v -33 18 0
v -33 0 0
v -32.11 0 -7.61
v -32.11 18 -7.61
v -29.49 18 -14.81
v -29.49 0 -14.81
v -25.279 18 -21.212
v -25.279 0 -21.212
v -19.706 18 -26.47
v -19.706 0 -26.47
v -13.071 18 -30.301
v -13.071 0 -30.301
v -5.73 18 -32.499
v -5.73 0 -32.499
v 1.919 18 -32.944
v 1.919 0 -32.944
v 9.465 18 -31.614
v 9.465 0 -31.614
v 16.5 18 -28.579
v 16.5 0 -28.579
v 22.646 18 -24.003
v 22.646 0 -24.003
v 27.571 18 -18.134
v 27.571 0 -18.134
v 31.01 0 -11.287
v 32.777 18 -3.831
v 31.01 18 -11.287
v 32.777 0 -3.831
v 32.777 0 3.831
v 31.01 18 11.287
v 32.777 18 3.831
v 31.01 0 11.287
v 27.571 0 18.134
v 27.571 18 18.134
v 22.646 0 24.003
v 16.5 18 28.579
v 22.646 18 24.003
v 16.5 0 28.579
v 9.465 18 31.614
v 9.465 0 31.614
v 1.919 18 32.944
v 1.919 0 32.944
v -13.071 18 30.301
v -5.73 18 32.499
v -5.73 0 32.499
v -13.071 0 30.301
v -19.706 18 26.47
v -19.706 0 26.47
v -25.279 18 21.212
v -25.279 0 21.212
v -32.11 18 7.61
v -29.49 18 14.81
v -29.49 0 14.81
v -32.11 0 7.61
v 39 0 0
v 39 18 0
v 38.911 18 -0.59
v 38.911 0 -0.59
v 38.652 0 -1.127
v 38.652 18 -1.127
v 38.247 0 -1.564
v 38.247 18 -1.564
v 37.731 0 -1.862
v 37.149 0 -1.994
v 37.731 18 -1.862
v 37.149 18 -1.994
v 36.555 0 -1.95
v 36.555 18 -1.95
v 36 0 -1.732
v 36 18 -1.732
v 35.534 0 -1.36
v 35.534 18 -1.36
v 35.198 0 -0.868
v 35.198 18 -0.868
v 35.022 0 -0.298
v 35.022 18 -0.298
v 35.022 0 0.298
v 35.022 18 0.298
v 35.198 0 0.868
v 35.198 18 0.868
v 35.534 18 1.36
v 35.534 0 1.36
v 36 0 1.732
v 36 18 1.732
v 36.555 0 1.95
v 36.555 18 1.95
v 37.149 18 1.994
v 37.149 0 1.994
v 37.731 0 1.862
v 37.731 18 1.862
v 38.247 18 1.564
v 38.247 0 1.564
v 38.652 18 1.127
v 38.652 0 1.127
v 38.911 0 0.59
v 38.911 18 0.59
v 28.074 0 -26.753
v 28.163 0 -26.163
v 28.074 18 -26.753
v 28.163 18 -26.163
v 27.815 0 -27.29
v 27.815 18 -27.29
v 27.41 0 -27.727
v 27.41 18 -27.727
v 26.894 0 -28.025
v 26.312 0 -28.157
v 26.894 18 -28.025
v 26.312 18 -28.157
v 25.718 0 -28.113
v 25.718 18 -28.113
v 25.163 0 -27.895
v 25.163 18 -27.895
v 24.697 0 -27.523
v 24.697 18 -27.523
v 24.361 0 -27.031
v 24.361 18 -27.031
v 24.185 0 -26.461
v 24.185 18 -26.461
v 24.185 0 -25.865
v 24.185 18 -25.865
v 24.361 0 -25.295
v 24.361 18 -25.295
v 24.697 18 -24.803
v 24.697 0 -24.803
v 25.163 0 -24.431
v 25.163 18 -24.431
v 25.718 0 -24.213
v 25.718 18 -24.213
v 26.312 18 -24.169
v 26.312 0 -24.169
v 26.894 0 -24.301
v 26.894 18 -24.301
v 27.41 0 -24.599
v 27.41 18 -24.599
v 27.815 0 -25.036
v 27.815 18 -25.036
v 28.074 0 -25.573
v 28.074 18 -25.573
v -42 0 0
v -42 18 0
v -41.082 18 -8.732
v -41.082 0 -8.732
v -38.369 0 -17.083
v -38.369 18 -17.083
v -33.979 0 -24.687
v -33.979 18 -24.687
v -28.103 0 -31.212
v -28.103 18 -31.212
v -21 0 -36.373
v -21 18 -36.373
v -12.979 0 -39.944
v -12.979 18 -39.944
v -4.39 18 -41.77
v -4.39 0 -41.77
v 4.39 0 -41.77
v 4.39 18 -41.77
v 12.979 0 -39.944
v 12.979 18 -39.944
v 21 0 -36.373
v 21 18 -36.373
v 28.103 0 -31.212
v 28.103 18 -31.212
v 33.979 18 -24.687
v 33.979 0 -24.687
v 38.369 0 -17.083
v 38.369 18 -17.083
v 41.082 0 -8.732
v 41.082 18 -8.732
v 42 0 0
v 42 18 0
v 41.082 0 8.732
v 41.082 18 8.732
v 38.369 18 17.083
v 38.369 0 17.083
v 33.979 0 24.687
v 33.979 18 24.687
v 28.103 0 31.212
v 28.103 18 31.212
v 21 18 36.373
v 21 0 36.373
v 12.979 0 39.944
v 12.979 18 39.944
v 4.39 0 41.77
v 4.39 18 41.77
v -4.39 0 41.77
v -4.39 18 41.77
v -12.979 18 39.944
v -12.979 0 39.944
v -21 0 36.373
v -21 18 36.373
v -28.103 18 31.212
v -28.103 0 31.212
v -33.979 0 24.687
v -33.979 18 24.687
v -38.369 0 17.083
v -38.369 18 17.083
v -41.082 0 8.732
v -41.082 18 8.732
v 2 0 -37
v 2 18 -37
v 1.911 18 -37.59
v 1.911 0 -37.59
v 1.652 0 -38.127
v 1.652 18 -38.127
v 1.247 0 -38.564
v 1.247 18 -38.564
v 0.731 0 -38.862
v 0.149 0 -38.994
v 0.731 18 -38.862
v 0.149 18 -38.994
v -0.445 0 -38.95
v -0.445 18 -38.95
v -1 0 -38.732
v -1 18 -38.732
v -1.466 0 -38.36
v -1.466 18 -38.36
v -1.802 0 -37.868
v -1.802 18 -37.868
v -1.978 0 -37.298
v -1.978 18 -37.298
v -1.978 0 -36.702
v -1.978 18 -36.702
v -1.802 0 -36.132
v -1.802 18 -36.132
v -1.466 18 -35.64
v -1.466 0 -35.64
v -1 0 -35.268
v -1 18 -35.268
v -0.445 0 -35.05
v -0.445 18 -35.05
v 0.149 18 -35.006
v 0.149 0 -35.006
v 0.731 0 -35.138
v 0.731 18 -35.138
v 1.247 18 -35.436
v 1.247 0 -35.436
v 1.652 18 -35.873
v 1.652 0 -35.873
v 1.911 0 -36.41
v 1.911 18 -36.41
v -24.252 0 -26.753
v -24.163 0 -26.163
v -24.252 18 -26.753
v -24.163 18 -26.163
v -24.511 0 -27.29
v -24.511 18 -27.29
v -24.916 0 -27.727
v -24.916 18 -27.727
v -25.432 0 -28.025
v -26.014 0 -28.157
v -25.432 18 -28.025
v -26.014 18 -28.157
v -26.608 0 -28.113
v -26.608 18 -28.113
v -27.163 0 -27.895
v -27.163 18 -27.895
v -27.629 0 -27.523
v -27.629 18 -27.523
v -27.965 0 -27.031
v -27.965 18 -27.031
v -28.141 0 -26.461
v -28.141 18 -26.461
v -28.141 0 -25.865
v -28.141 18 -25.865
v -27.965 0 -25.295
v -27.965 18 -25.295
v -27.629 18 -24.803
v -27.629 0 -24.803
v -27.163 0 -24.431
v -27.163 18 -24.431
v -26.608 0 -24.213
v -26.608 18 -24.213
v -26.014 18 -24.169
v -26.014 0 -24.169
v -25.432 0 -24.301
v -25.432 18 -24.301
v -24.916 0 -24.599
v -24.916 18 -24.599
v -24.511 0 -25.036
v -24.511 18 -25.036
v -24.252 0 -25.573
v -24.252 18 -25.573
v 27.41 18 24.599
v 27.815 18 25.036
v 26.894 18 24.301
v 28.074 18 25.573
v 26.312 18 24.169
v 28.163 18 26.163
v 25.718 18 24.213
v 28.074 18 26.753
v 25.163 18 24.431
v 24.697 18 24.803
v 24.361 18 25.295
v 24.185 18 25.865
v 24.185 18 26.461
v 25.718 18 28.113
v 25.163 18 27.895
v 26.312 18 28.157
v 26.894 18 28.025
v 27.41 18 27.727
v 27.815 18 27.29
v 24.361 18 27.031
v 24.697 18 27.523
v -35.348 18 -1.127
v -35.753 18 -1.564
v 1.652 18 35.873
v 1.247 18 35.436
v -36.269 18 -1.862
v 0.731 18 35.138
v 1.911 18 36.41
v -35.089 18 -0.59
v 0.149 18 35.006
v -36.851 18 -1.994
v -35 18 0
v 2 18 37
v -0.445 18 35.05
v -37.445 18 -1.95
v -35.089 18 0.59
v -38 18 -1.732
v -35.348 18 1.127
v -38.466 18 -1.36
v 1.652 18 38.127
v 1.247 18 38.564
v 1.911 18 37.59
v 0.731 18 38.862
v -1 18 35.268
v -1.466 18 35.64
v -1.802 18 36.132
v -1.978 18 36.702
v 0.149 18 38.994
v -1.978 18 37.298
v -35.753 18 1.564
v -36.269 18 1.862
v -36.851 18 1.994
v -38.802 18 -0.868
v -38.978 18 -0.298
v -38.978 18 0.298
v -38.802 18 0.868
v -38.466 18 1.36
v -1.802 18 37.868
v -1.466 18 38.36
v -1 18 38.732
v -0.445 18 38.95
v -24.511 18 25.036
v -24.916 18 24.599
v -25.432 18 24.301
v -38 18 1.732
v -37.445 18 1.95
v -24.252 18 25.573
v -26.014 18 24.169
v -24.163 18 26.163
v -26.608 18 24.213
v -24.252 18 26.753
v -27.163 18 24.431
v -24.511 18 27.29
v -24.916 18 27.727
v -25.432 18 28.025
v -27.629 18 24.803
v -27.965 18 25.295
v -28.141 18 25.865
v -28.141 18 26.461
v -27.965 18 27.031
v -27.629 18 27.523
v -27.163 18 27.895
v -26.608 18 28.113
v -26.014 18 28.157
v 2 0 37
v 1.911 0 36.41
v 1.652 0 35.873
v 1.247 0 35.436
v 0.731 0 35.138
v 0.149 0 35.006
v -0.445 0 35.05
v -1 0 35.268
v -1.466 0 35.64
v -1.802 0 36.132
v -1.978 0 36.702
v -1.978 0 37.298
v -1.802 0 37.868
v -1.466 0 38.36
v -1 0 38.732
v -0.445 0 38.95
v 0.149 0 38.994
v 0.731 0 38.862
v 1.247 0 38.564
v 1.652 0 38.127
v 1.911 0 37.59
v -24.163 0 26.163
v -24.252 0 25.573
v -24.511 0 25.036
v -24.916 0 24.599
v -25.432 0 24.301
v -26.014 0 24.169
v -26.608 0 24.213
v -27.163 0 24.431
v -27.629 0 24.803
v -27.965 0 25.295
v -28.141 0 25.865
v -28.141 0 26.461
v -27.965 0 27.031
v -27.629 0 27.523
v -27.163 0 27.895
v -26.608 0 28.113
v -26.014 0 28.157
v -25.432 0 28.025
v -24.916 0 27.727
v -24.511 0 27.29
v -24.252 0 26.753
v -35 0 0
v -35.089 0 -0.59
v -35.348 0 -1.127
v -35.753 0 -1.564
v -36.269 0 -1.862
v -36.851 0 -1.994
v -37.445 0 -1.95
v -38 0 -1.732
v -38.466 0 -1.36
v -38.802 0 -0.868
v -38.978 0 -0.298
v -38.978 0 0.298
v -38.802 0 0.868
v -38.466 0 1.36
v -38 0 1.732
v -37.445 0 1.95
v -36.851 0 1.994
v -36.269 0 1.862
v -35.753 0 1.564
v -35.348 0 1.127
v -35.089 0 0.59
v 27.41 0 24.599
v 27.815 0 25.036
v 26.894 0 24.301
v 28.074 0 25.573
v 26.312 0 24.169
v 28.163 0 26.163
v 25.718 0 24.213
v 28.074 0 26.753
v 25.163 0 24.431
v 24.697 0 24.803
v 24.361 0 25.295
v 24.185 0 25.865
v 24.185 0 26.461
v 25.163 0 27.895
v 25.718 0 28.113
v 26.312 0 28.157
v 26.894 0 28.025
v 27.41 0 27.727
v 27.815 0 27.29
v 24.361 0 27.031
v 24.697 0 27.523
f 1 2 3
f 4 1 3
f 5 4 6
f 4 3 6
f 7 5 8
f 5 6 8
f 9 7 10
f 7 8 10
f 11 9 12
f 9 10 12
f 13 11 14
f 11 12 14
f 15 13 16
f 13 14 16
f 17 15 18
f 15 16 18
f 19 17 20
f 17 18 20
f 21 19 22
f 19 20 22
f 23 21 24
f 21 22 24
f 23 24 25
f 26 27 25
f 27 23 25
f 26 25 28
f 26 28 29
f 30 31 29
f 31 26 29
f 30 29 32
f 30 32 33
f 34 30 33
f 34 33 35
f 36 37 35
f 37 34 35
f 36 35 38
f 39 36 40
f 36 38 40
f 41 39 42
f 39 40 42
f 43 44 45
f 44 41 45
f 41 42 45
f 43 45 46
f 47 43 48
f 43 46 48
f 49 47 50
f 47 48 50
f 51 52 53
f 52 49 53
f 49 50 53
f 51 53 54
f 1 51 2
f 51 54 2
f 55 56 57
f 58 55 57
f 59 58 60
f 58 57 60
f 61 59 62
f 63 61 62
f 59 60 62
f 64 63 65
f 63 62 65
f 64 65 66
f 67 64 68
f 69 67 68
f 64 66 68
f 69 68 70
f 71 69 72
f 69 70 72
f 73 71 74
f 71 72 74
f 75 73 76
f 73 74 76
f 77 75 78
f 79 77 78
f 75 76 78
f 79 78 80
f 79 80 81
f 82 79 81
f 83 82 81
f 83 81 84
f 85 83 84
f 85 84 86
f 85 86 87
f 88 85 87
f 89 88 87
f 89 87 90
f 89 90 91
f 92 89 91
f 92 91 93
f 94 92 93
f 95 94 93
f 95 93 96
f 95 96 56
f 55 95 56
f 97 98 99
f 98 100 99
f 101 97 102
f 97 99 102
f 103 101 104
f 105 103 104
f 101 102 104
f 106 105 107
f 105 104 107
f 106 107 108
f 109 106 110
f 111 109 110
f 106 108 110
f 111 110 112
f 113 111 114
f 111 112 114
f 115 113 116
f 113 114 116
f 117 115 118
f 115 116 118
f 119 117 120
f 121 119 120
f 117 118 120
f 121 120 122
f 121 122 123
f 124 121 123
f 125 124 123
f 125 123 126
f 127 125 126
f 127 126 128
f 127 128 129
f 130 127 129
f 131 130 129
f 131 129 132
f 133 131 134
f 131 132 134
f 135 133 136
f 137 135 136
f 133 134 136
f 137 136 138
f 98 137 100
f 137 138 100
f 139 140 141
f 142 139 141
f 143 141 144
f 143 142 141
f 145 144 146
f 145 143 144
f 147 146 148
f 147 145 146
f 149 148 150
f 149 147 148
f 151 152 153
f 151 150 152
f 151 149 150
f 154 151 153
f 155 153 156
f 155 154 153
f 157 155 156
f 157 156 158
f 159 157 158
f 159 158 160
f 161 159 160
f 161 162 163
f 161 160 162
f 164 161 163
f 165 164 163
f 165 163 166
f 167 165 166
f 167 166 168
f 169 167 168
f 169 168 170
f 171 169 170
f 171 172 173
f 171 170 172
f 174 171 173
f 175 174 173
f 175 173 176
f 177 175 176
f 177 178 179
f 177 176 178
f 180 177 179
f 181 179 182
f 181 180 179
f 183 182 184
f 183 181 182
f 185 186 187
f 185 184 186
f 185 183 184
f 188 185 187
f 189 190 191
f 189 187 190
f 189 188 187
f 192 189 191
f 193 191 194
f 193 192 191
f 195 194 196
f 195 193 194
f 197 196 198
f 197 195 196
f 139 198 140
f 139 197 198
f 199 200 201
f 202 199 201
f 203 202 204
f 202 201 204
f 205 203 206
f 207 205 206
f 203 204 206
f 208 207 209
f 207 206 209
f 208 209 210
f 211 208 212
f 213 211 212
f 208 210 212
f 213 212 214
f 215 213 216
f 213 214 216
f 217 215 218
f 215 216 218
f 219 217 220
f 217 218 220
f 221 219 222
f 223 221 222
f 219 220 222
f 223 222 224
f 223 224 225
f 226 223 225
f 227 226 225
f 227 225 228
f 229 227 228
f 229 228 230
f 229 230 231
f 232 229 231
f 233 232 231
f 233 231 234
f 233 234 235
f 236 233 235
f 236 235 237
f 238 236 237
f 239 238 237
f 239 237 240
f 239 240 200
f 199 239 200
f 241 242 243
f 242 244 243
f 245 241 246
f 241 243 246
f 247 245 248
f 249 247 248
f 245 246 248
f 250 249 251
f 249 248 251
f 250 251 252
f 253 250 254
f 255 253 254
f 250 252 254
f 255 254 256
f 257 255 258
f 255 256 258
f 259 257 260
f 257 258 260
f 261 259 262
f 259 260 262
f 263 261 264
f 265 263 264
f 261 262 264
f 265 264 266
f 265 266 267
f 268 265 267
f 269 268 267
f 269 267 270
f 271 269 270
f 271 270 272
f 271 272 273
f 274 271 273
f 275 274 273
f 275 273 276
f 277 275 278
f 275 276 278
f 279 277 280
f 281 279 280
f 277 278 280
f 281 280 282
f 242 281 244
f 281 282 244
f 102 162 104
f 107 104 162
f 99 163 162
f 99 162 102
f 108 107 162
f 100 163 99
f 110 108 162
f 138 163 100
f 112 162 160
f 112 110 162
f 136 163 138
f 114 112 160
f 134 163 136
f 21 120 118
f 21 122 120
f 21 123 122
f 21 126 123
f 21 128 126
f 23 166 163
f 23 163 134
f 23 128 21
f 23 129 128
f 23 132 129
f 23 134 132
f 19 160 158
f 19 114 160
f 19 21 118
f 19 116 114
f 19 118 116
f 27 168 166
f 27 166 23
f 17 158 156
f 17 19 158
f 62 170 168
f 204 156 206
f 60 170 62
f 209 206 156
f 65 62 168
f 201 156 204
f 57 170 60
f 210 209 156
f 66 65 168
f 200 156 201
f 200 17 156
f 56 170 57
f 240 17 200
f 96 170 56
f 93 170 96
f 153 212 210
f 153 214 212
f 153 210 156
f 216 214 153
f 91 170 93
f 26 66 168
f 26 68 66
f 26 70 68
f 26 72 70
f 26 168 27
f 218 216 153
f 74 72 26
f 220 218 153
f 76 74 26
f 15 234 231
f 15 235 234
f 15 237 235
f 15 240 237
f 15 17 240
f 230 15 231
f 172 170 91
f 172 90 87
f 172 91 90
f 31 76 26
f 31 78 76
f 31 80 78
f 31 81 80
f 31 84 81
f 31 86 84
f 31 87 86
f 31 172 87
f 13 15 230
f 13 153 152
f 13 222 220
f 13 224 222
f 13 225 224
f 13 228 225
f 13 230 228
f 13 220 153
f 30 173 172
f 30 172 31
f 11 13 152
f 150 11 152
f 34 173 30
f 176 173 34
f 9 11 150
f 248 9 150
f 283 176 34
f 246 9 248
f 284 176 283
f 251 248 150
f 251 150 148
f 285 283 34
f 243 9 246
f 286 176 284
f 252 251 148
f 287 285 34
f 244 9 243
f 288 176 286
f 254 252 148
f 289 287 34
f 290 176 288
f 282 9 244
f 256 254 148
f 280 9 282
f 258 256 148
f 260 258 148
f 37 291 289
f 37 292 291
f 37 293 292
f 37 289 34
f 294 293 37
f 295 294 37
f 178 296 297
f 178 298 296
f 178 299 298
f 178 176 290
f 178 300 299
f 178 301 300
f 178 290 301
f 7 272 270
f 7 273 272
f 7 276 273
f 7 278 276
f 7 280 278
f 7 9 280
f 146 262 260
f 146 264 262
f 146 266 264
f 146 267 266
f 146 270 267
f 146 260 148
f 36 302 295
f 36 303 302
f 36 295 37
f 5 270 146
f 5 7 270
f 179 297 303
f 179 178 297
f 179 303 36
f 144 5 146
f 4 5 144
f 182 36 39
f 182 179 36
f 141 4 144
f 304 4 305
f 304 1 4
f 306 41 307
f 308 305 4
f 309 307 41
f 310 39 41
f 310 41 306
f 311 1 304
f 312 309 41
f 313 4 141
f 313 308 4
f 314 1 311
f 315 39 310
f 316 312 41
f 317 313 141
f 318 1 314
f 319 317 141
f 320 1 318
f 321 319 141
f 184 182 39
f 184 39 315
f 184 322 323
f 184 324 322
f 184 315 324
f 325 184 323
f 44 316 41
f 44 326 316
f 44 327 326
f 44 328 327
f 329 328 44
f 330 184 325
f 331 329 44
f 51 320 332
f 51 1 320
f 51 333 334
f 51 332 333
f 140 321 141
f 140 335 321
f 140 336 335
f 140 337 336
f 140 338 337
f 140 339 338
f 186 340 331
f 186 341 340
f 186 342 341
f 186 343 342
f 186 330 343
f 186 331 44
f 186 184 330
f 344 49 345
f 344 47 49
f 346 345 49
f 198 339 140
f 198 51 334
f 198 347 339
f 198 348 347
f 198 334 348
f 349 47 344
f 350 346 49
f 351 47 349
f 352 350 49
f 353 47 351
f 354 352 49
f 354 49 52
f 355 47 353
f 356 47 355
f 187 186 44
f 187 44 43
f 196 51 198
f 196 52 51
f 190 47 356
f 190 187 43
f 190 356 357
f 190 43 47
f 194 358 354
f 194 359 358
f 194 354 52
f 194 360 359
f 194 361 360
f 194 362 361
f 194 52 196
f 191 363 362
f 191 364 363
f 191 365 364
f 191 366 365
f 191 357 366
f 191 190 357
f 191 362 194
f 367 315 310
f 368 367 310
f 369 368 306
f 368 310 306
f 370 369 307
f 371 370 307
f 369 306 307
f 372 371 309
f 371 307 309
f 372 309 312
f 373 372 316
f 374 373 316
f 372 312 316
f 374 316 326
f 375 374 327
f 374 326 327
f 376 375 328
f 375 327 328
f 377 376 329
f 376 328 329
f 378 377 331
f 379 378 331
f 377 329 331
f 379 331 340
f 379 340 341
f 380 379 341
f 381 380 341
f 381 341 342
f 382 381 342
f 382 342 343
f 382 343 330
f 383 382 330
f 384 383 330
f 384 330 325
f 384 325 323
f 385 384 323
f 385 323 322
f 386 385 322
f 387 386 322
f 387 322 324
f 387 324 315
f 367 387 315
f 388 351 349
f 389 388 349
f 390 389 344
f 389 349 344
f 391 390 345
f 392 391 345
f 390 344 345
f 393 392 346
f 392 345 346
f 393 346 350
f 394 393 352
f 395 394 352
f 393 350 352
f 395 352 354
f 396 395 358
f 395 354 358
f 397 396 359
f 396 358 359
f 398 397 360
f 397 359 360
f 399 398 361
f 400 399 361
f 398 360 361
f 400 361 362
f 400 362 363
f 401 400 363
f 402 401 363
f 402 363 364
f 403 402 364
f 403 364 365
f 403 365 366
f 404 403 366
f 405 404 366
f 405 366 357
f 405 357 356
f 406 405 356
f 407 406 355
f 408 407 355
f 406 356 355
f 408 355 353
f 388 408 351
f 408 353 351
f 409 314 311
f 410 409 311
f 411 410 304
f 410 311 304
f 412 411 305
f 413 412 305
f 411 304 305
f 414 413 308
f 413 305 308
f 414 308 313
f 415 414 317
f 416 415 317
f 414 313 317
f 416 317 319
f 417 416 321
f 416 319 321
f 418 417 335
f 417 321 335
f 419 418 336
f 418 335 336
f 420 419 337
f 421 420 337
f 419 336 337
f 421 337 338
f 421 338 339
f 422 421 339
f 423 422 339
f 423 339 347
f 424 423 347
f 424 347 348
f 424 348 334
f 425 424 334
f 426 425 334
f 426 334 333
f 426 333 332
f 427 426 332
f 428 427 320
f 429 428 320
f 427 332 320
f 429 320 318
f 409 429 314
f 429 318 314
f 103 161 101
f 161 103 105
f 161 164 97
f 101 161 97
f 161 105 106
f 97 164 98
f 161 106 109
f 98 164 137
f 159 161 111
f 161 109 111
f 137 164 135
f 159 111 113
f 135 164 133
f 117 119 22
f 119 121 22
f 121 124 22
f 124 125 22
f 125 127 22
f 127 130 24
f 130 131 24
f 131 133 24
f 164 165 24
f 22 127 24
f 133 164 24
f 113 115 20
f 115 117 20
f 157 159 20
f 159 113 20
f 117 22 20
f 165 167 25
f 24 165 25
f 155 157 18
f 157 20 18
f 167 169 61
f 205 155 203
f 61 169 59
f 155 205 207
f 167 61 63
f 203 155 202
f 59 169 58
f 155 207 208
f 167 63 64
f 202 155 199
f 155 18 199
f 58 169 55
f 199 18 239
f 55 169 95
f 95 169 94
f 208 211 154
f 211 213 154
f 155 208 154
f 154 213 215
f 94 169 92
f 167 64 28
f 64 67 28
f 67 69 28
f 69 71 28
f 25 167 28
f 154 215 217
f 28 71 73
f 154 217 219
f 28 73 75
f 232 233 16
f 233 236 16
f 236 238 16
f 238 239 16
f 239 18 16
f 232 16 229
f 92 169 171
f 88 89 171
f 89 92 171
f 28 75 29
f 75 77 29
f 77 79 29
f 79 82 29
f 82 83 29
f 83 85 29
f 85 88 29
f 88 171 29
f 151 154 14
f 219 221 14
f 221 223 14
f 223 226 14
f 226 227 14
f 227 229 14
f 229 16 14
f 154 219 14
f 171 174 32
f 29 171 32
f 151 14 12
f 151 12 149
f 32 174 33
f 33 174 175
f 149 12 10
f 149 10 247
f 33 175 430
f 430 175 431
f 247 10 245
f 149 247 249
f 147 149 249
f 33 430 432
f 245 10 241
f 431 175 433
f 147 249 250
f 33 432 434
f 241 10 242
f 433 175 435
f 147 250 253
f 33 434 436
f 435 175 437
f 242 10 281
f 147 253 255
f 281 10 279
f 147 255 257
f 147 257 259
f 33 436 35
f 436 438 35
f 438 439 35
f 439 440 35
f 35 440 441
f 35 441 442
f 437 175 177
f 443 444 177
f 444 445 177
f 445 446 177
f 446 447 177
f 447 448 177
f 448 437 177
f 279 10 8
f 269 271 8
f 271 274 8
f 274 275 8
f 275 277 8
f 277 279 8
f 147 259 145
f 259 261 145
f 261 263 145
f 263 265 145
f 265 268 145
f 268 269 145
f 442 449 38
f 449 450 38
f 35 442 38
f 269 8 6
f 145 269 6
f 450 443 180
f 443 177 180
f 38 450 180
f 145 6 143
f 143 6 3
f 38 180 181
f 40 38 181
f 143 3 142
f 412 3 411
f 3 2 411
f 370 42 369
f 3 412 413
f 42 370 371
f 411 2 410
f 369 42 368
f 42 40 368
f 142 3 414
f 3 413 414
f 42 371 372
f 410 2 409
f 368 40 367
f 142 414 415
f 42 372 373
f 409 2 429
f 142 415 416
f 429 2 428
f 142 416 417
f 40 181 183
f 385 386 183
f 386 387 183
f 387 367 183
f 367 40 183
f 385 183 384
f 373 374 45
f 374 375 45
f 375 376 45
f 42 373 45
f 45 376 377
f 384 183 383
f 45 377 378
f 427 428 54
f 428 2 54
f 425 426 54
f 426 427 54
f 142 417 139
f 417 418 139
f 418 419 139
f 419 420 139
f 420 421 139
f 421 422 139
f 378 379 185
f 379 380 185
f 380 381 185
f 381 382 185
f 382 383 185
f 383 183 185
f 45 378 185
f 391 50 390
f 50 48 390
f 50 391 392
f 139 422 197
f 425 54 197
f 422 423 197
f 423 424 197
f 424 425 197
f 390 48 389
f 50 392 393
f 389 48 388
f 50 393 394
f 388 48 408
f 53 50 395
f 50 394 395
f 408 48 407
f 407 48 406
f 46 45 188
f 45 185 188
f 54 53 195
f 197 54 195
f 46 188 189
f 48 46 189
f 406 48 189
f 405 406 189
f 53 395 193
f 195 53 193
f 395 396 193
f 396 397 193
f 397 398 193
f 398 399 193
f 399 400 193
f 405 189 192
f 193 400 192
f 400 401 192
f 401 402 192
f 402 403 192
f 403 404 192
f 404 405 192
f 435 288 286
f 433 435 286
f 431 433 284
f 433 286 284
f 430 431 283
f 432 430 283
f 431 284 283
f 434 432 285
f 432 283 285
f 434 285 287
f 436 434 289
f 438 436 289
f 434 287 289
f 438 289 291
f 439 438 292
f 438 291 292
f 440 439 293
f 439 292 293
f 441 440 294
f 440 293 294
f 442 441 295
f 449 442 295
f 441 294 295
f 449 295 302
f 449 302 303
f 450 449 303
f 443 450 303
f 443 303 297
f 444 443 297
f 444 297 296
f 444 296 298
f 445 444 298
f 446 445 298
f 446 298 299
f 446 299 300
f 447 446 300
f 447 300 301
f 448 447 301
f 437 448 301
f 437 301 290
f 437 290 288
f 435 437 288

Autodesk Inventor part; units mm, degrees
ref_plane "YZ Plane" through (0, 0, 0) normal (1, 0, 0) x (0, 1, 0)
ref_plane "XZ Plane" through (0, 0, 0) normal (0, 1, 0) x (-1, 0, 0)
ref_plane "XY Plane" through (0, 0, 0) normal (0, 0, 1) x (1, 0, 0)
sketch "Sketch1" plane through (0, 0, 0) normal (0, 1, 0) x (-1, 0, 0)
  circle A0 centre (0, 0) radius 33
  circle A1 centre (0, 0) radius 42
  dimension "d0" = 66
  dimension "d1" = 84
extrude "Extrusion1" add sketch "Sketch1" along normal blind 18
sketch "Sketch2" plane through (0, 18, 0) normal (0, 1, 0) x (1, 0, 0)
  circle A0 centre (0, 37) radius 2
  circle A1 centre (-26.163, 26.163) radius 2
  circle A2 centre (-37, 0) radius 2
  circle A3 centre (-26.163, -26.163) radius 2
  circle A4 centre (0, -37) radius 2
  circle A5 centre (26.163, -26.163) radius 2
  circle A6 centre (37, 0) radius 2
  circle A7 centre (26.163, 26.163) radius 2
  point P0 (0, 0)
  dimension "d4" = 4
  dimension "d5" = 37
  dimension "d8" = 360
extrude "Extrusion2" cut sketch "Sketch2" against normal up to surface (18 mm away)
properties part number "Gearbox_MainBody" material "PC/ABS Plastic"
